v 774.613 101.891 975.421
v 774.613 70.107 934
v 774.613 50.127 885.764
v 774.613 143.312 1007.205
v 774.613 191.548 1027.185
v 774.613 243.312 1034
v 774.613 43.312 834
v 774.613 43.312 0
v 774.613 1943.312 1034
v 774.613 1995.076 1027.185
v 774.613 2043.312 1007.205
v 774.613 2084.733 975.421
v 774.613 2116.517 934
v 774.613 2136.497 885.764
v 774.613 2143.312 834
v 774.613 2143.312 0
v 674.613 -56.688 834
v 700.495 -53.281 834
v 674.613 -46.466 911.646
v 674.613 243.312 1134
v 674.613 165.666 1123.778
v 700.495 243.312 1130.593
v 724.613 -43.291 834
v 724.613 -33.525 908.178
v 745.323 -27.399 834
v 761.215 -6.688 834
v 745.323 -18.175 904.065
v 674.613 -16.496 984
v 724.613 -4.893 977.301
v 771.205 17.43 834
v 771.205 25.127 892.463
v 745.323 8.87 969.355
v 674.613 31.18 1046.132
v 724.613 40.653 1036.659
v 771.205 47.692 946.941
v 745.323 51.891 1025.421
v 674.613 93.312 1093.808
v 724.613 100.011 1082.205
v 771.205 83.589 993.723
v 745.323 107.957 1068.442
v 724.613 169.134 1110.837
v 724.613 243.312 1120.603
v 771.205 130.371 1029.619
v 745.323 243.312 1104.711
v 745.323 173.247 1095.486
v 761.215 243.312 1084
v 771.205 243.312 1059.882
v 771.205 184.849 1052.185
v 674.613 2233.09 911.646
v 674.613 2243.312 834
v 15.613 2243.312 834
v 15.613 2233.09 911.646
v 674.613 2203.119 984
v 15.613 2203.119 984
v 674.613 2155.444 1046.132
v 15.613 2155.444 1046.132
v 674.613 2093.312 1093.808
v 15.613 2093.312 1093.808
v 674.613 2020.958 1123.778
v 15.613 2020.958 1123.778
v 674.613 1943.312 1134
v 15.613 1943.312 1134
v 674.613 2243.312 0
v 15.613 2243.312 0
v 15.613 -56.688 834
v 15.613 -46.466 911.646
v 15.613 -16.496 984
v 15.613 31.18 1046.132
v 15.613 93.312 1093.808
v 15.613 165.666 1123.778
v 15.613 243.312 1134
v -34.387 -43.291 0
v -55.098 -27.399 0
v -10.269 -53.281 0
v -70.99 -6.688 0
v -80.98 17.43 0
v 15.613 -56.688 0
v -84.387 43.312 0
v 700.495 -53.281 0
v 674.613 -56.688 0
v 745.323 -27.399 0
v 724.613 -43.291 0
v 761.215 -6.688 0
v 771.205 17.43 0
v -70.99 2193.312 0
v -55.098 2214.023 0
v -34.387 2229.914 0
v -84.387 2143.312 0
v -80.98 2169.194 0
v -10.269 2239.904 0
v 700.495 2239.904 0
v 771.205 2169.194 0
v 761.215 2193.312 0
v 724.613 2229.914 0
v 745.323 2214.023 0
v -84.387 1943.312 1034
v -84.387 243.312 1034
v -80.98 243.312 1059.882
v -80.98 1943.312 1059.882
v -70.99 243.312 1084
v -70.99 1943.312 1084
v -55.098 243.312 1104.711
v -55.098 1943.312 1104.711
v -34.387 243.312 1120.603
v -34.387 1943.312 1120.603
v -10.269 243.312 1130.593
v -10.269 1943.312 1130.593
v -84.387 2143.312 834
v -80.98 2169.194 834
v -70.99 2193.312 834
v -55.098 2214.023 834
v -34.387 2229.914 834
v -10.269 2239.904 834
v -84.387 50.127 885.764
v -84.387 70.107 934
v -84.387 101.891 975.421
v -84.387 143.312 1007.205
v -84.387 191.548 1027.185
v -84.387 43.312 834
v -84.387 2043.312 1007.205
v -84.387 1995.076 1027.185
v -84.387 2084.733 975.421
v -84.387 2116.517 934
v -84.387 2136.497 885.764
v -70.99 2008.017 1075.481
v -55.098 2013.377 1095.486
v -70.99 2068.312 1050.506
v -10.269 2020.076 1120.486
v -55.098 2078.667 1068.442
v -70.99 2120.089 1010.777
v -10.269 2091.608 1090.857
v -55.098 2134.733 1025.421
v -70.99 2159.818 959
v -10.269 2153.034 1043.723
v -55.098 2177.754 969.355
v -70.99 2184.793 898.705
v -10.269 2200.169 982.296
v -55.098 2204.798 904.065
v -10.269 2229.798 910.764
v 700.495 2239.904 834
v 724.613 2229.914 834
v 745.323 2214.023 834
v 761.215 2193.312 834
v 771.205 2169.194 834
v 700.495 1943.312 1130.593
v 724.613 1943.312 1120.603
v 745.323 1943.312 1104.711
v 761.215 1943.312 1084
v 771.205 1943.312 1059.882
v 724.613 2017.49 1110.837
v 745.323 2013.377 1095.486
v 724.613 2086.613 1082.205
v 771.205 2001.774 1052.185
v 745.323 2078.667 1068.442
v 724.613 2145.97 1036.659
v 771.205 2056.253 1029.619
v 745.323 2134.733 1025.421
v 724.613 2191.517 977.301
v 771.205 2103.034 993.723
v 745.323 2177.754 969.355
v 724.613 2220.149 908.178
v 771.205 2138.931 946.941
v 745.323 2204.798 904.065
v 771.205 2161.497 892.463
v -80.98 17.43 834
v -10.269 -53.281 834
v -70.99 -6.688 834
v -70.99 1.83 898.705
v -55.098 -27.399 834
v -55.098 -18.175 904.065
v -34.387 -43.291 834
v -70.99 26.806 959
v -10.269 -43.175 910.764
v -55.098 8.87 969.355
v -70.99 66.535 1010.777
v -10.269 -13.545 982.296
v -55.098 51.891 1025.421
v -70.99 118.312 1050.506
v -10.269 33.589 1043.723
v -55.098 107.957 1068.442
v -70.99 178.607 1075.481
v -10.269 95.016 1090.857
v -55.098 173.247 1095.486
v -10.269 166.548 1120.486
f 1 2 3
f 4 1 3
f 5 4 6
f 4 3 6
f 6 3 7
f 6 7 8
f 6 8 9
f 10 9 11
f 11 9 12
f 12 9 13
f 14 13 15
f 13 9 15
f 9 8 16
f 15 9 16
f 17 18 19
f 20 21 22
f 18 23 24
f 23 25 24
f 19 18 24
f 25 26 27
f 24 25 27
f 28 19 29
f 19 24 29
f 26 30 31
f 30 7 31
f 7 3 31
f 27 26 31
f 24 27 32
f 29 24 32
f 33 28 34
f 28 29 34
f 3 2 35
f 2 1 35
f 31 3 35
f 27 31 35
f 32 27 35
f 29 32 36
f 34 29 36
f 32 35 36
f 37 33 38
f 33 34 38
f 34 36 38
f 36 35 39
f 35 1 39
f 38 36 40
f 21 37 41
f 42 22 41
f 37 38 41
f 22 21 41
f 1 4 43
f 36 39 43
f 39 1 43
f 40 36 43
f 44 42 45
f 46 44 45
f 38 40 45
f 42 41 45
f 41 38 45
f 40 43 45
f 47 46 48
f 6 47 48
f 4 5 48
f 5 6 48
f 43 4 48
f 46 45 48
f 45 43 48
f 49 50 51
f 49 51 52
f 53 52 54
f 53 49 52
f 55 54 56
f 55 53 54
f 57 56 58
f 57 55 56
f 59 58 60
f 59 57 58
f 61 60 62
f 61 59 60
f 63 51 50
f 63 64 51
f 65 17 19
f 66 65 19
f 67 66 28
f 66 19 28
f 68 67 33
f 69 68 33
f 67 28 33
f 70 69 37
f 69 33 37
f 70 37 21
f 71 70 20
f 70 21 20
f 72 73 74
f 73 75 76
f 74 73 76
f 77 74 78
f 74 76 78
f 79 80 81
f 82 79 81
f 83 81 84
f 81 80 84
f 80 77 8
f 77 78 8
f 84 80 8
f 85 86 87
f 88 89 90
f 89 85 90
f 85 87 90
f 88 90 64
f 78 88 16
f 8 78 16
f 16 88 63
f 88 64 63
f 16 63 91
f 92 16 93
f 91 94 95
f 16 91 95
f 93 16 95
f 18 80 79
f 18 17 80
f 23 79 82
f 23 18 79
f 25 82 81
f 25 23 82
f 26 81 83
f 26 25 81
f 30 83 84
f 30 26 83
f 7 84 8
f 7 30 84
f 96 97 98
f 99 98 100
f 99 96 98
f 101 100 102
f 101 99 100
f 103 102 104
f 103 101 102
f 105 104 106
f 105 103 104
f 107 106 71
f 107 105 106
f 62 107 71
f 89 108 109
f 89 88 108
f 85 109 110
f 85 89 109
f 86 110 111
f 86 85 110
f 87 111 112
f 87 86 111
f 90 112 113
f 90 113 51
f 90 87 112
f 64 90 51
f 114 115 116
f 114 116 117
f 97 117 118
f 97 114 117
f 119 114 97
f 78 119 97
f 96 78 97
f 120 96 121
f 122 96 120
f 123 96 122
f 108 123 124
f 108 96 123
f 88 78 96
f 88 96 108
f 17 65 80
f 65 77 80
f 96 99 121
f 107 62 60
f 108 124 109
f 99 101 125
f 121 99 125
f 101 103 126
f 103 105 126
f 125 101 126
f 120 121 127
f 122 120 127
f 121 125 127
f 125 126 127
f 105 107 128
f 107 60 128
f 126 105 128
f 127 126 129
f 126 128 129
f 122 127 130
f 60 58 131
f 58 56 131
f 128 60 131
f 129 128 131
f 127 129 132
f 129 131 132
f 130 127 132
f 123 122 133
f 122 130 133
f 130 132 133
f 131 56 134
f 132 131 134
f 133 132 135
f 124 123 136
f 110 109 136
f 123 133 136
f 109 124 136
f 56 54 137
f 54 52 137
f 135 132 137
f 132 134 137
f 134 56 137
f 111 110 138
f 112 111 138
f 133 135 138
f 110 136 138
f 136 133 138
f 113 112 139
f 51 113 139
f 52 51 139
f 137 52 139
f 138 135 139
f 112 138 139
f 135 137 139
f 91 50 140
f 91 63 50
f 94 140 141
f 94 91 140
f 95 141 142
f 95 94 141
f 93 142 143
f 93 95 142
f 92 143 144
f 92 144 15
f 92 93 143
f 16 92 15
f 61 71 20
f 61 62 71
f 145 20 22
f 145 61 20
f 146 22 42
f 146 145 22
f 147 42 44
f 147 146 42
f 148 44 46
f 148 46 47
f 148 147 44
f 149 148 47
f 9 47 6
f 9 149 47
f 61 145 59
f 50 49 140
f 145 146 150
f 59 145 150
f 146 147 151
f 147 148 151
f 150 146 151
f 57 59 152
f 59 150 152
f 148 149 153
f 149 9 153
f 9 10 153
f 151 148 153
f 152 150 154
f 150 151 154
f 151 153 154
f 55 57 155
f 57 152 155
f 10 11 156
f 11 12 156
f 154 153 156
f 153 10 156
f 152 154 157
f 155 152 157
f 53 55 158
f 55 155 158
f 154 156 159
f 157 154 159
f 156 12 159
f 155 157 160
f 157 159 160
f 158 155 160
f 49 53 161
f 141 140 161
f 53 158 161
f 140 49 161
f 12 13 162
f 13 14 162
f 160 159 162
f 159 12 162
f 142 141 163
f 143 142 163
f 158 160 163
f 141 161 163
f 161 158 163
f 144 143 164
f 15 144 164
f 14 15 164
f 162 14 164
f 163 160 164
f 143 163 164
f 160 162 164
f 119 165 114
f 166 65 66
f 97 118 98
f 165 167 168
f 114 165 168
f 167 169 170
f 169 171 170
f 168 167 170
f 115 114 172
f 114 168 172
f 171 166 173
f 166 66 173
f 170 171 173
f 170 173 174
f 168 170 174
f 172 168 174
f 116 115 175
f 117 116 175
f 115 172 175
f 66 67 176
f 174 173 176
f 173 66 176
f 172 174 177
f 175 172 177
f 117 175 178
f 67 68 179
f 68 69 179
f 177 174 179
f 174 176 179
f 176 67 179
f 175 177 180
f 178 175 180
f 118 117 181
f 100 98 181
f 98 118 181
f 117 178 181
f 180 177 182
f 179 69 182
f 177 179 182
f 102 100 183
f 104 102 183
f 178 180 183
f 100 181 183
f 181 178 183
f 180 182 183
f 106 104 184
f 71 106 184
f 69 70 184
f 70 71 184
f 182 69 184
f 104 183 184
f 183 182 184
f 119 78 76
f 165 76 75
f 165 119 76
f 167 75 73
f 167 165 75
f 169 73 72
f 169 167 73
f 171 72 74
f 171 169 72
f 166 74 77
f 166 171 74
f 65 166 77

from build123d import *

# Parameters (mm, degrees)
F0_W     = 859
F0_H     = 2300
F1_DEPTH = 1134
F2_R     = 300
F3_R     = 100


with BuildPart() as f1:
    # F0 (on Top) → F1 (new body)
    with BuildSketch(Plane.XY):
        with Locations((345.1126752496, 1093.3118626475)):
            Rectangle(F0_W, F0_H)
    extrude(amount=F1_DEPTH)

    # F2
    f2_edges = [f1.edges().sort_by_distance(p)[0] for p in [
        (345.112675, -56.688137, 1134),
        (345.112675, 2243.311863, 1134),
    ]]
    fillet(f2_edges, radius=F2_R)

    # F3
    f3_edges = [f1.edges().sort_by_distance(p)[0] for p in [
        (774.612675, 1093.311863, 1134),
        (774.612675, 31.179828, 1046.132034),
        (774.612675, -56.688137, 417),
        (774.612675, 2155.443897, 1046.132034),
        (774.612675, 2243.311863, 417),
        (-84.387325, -56.688137, 417),
        (-84.387325, 31.179828, 1046.132034),
        (-84.387325, 1093.311863, 1134),
        (-84.387325, 2155.443897, 1046.132034),
        (-84.387325, 2243.311863, 417),
    ]]
    fillet(f3_edges, radius=F3_R)


solid = f1.part
